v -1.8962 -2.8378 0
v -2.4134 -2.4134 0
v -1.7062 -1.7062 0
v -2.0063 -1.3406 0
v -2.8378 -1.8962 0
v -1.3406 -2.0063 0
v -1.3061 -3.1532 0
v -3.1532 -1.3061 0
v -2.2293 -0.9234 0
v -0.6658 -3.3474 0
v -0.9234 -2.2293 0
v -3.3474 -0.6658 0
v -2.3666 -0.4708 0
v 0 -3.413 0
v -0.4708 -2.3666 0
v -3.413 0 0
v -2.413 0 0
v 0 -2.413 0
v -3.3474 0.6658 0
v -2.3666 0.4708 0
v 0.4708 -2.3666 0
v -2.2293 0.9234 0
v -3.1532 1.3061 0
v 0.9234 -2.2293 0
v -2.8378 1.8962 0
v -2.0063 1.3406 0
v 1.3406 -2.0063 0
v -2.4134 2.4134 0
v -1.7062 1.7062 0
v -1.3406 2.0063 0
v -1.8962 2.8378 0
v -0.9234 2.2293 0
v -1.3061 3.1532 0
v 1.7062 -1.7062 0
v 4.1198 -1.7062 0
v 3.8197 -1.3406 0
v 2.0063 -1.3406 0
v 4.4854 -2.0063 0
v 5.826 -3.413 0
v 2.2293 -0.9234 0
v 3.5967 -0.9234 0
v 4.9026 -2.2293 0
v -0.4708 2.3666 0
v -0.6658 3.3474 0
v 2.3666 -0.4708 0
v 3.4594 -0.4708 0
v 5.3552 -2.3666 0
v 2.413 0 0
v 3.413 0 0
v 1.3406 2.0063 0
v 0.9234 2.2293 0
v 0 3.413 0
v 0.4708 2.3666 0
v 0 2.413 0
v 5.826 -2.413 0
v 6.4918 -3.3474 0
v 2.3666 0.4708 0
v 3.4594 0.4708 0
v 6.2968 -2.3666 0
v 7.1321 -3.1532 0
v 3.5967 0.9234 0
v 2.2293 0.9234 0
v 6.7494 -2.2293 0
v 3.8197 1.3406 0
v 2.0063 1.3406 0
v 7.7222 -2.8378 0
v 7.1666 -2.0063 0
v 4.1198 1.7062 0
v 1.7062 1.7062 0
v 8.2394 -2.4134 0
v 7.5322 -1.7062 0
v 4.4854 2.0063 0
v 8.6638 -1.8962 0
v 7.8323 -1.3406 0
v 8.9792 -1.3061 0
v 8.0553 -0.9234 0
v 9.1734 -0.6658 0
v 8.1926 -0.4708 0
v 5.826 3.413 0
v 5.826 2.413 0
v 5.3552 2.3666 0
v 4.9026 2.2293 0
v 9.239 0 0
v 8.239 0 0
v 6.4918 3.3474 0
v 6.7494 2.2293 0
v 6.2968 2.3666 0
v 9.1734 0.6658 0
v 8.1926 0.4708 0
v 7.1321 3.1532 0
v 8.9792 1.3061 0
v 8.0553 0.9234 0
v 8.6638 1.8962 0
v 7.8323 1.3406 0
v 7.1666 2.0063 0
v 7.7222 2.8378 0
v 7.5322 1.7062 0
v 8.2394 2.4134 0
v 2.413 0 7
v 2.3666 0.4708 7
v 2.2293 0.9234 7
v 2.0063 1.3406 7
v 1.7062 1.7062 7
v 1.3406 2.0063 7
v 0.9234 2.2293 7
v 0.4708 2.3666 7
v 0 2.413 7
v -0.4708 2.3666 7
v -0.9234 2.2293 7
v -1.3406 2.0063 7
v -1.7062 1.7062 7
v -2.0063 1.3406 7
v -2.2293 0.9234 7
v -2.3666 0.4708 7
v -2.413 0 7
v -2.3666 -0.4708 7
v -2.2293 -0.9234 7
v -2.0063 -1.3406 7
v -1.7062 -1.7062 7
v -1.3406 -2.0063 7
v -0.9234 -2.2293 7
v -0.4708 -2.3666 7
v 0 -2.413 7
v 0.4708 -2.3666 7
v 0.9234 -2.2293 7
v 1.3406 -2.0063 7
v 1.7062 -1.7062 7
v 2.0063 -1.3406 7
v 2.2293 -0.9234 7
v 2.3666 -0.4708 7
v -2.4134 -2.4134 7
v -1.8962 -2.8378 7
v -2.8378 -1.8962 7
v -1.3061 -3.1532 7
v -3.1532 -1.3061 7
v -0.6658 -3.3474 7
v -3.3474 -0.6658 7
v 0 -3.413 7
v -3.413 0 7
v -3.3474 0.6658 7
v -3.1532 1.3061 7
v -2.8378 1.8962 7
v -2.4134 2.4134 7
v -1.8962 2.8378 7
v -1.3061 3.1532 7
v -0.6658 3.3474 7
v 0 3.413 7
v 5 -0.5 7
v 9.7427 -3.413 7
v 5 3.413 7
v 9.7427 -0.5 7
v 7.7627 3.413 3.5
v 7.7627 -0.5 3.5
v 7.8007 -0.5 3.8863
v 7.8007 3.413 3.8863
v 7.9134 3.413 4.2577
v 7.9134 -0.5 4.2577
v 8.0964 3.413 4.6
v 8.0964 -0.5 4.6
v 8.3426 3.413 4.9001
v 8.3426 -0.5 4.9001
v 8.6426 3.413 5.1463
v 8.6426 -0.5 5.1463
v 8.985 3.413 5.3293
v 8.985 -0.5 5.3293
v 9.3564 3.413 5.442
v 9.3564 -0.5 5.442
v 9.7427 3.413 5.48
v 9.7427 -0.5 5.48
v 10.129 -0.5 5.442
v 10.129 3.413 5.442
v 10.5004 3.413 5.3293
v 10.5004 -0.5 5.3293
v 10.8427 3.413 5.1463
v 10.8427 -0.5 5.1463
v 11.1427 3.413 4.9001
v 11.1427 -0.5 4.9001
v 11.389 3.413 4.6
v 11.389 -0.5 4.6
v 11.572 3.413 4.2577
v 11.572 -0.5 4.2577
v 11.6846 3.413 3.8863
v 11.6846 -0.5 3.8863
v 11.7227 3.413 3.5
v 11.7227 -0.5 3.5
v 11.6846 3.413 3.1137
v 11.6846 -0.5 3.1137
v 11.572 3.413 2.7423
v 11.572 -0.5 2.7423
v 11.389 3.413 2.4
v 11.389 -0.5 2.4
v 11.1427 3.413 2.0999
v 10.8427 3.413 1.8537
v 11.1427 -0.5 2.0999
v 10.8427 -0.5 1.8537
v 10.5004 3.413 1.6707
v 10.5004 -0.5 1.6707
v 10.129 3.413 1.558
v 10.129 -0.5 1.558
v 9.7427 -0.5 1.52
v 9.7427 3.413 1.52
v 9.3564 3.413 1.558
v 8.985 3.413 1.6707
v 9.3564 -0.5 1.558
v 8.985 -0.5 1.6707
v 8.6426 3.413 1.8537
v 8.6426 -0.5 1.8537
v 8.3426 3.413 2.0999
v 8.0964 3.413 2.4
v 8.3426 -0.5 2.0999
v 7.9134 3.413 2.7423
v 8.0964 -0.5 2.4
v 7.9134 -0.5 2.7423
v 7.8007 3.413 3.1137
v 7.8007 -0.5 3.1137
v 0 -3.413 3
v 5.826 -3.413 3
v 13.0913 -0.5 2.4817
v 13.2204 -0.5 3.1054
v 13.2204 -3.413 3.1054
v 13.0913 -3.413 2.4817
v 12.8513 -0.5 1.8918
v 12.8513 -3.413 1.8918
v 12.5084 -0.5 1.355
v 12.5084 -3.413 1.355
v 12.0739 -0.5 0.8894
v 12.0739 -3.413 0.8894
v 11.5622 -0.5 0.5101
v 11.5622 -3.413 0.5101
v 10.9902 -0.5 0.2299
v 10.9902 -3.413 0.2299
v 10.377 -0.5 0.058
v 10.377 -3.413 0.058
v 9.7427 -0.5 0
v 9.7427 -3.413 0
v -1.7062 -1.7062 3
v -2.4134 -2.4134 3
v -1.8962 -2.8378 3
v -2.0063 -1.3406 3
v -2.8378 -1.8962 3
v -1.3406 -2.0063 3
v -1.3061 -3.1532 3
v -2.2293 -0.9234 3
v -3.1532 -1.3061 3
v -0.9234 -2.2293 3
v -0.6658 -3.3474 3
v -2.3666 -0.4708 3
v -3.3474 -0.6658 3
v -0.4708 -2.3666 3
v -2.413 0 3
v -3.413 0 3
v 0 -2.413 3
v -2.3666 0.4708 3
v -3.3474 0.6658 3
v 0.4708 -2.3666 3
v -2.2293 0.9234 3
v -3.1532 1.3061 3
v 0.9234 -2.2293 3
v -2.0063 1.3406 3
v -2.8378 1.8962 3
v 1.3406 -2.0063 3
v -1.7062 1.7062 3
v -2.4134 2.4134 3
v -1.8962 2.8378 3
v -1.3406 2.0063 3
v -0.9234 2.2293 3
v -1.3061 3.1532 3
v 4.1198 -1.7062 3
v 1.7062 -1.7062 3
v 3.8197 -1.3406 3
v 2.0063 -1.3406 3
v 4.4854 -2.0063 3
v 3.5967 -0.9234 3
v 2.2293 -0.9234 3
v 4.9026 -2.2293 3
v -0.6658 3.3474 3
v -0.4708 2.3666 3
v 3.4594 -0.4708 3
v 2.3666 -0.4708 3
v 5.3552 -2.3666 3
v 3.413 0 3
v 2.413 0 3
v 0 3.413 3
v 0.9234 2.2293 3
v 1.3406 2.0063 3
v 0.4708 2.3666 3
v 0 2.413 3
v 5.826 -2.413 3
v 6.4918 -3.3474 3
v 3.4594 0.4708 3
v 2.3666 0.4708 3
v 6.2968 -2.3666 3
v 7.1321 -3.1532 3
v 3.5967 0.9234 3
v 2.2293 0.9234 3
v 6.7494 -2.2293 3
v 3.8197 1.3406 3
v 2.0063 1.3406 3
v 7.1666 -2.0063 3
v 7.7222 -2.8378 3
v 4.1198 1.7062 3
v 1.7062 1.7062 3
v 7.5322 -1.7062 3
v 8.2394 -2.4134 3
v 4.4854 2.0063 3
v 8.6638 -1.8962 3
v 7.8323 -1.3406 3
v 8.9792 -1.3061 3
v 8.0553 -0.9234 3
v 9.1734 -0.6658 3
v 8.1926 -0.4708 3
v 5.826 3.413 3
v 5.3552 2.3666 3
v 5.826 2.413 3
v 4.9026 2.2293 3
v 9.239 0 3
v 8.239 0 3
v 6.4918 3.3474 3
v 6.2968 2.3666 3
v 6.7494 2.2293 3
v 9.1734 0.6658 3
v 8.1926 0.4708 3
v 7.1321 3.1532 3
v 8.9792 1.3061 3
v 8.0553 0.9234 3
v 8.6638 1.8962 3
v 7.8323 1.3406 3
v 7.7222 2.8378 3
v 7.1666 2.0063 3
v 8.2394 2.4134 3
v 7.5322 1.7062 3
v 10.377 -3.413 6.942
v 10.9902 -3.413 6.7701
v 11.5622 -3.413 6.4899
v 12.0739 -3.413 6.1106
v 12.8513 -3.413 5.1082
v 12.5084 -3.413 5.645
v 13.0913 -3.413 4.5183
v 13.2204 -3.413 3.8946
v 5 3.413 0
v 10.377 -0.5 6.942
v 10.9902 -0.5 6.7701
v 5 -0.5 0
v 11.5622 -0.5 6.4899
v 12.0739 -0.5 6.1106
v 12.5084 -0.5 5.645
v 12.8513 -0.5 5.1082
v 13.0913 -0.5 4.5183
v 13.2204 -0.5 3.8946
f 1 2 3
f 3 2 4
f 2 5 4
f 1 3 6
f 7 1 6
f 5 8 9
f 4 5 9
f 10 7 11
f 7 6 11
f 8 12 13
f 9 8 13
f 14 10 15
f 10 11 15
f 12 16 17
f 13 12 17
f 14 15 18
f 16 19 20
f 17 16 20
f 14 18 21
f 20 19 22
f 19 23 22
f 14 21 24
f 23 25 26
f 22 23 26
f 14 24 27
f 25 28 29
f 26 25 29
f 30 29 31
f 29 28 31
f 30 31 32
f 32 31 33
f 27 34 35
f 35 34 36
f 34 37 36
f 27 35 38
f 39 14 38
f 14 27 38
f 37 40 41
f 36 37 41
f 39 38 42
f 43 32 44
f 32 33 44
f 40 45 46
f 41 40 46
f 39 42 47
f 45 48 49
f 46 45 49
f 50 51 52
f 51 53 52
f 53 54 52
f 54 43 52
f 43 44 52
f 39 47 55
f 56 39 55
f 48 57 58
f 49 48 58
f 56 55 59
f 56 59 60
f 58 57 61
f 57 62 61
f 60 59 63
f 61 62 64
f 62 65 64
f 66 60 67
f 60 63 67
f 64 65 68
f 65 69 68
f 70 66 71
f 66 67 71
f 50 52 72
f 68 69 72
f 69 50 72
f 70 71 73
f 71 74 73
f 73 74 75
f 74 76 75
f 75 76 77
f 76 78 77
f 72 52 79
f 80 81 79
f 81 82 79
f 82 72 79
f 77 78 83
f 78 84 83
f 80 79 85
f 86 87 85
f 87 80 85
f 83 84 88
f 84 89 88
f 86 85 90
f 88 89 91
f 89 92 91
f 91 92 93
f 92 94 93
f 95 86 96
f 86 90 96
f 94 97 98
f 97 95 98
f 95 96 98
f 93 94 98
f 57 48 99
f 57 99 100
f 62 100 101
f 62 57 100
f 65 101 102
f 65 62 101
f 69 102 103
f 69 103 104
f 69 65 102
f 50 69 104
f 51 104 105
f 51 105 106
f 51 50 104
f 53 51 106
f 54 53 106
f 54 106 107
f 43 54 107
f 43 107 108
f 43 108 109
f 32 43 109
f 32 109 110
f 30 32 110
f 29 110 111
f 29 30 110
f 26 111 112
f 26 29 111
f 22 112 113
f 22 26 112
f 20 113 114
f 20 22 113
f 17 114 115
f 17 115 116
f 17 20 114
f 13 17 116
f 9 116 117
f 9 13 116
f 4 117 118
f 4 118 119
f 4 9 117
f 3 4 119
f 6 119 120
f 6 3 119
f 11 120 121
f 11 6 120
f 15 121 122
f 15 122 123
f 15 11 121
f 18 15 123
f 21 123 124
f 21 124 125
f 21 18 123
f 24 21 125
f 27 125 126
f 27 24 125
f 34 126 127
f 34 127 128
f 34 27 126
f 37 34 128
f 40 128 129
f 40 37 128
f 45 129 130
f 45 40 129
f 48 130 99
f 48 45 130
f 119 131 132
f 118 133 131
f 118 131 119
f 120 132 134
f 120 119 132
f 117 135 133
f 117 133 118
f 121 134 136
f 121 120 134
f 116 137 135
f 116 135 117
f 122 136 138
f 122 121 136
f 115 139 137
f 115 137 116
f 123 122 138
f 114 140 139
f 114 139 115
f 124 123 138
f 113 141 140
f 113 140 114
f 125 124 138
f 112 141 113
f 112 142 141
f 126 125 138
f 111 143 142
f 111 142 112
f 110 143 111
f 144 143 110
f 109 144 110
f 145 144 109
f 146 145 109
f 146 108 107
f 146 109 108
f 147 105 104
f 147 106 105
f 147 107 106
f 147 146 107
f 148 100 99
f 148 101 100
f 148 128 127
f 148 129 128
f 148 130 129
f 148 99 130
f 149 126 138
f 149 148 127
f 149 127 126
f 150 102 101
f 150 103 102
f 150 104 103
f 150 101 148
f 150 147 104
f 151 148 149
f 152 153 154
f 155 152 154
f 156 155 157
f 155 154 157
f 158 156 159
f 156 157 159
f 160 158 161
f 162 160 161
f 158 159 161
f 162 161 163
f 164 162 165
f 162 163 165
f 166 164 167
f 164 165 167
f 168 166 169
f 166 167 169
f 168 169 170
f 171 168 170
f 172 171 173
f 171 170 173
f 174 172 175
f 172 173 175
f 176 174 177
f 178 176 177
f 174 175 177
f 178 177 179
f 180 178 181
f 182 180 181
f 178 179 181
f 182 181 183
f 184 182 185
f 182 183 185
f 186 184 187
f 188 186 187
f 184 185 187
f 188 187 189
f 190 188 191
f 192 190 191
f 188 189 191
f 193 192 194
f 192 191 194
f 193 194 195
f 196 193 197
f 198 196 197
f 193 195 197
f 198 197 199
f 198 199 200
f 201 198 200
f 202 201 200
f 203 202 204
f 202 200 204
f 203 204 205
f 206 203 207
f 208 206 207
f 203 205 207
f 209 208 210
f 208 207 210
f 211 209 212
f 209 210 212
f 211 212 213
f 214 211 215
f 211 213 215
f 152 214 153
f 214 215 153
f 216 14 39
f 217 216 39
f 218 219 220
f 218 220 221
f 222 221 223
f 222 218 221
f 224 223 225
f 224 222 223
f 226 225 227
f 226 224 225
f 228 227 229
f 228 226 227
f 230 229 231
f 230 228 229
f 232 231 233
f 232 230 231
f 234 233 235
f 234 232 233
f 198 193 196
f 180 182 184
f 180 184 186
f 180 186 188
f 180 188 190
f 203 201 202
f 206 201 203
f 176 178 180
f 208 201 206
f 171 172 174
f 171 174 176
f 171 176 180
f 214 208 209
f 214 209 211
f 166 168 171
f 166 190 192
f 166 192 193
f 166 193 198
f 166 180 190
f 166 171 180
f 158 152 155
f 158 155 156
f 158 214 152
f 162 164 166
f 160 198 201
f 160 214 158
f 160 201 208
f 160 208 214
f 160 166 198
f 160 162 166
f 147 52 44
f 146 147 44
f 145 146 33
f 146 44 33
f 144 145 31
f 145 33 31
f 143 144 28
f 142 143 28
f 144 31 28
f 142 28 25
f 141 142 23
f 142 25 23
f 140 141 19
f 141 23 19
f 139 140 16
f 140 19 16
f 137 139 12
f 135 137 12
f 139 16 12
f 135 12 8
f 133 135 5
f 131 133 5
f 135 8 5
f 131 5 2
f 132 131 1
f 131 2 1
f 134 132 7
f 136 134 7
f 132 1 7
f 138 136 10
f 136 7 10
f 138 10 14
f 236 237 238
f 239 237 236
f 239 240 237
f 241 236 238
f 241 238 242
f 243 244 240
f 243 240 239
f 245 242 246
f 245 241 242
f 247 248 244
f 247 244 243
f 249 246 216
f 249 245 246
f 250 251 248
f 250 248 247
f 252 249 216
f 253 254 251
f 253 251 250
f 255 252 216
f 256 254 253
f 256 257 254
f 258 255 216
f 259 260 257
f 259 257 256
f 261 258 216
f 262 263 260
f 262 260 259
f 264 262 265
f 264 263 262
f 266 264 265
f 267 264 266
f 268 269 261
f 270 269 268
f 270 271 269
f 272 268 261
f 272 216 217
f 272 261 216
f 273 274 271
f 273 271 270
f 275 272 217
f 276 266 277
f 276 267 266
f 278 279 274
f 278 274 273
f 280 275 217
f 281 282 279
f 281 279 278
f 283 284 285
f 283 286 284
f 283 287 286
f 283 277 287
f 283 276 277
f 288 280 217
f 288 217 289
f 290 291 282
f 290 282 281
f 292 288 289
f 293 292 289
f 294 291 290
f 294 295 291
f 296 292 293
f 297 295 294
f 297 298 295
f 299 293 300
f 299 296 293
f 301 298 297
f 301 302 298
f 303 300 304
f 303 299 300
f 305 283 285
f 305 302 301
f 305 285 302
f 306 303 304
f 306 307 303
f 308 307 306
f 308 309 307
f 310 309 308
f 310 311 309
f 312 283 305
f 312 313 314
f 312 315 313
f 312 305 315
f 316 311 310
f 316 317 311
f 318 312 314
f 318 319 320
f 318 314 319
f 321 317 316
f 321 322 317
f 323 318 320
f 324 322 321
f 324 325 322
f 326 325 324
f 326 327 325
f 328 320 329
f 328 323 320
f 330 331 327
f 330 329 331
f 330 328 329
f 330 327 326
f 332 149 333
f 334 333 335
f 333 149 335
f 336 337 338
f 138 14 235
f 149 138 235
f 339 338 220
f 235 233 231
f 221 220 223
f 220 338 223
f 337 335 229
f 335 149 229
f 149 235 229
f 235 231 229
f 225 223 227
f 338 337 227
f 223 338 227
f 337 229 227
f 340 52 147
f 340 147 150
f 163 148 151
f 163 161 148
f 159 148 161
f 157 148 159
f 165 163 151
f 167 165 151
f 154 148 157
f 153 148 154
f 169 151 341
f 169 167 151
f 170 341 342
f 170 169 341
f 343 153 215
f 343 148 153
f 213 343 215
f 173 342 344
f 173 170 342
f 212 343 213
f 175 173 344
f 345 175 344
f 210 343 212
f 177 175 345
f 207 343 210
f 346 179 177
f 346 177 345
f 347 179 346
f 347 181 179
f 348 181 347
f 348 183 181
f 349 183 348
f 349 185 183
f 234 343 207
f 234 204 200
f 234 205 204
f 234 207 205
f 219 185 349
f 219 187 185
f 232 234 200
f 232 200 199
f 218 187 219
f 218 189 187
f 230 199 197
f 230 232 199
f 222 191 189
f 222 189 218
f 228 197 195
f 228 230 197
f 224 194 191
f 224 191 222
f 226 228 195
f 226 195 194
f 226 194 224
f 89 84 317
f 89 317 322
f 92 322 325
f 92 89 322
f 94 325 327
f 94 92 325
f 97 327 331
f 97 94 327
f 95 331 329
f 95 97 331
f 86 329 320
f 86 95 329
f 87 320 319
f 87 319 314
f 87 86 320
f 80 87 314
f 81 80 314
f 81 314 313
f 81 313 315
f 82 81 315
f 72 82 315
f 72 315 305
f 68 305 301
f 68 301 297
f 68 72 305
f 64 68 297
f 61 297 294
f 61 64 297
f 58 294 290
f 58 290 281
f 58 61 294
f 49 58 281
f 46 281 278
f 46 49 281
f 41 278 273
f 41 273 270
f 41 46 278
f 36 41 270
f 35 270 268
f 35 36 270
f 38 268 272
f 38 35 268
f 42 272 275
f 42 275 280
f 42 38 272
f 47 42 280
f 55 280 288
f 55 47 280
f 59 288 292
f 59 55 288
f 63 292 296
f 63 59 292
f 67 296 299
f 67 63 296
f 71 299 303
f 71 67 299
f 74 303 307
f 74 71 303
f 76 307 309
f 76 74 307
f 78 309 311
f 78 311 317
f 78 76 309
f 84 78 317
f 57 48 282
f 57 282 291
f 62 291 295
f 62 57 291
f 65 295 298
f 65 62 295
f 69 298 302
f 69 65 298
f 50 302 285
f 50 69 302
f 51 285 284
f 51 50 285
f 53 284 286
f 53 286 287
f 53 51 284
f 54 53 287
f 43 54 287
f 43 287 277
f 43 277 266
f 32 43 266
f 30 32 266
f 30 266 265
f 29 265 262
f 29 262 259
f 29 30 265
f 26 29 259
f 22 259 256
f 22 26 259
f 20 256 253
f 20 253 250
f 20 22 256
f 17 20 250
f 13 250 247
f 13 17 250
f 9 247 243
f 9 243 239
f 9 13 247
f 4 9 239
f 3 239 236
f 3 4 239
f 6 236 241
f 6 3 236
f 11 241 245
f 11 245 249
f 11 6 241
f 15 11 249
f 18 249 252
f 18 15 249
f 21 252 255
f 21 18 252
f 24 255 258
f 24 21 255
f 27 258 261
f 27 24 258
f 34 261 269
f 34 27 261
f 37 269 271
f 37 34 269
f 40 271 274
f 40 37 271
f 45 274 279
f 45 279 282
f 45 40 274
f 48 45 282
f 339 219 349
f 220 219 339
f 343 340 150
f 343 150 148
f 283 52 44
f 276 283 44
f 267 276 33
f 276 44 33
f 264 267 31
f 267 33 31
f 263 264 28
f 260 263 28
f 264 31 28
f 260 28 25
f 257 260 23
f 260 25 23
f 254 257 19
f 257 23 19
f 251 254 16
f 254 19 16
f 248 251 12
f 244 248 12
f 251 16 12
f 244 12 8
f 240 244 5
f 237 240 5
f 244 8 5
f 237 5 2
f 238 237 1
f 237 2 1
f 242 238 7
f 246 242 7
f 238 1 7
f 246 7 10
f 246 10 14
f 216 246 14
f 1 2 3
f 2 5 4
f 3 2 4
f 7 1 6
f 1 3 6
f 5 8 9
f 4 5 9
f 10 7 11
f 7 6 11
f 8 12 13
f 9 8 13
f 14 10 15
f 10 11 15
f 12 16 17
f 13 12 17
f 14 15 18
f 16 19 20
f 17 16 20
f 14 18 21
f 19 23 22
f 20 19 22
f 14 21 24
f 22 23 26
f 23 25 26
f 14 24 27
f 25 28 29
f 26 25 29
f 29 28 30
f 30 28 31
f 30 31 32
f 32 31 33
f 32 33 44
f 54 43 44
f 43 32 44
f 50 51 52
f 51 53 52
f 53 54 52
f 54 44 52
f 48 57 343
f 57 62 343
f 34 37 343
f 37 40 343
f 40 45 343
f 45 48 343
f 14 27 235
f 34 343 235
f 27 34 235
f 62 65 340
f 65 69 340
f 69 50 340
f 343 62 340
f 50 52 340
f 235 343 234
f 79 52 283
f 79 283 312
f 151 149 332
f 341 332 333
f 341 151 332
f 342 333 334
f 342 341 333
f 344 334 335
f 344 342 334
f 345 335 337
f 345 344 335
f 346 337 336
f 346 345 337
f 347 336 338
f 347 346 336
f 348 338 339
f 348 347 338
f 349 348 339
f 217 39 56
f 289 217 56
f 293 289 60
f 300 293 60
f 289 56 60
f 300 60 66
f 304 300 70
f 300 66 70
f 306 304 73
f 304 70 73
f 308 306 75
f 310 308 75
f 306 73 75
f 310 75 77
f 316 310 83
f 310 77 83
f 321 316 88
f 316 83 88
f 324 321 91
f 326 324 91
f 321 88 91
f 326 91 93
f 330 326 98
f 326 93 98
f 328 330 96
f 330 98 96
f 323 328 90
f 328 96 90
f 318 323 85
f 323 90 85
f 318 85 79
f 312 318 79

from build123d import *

# Parameters (mm, degrees)
SKETCH_R     = 2.413
PAD_DEPTH    = 3
SKETCH001_R  = 2.413
PAD001_DEPTH = 7
POCKET_DEPTH = 5
SKETCH003_R  = 1.98
PAD002_DEPTH = 3.913


with BuildPart() as old_bushing:
    # Sketch → Pad (new body)
    with BuildSketch(Plane.XY):
        with BuildLine():
            ThreePointArc((0, 3.413), (-3.413, 0), (0, -3.413))
            Line((0, -3.413), (5.826, -3.413))
            ThreePointArc((5.826, -3.413), (9.239, 0), (5.826, 3.413))
            Line((0, 3.413), (5.826, 3.413))
        make_face()
        Circle(SKETCH_R, mode=Mode.SUBTRACT)
        with Locations((5.826, 0)):
            Circle(SKETCH_R, mode=Mode.SUBTRACT)
    extrude(amount=PAD_DEPTH)


with BuildPart() as body001:
    # Sketch001 → Pad001 (new body)
    with BuildSketch(Plane.XY):
        with BuildLine():
            ThreePointArc((0, 3.413), (-3.413, 0), (0, -3.413))
            Line((0, -3.413), (13.220365, -3.413))
            Line((13.220365, -0.5), (13.220365, -3.413))
            Line((5, -0.5), (13.220365, -0.5))
            Line((5, 3.413), (5, -0.5))
            Line((0, 3.413), (5, 3.413))
        make_face()
        Circle(SKETCH001_R, mode=Mode.SUBTRACT)
    extrude(amount=PAD001_DEPTH)

    # Sketch002 (on Face5 of Pad001) → Pocket (cut)
    with BuildSketch(Plane(origin=(0, -0.5, 0), x_dir=(-1, 0, 0), z_dir=(0, 1, 0))):
        with BuildLine():
            ThreePointArc((-9.742675, 7), (-13.242675, 3.5), (-9.742675, 0))
            Line((-14.166568, 0), (-9.742675, 0))
            Line((-14.166568, 7), (-14.166568, 0))
            Line((-9.742675, 7), (-14.166568, 7))
        make_face()
    extrude(amount=-POCKET_DEPTH, mode=Mode.SUBTRACT)

    # Sketch003 (on Face5 of Pad001) → Pad002 (join)
    with BuildSketch(Plane(origin=(0, -0.5, 0), x_dir=(-1, 0, 0), z_dir=(0, 1, 0))):
        with Locations((-9.742675, 3.5)):
            Circle(SKETCH003_R)
    extrude(amount=PAD002_DEPTH)


solid = Compound([old_bushing.part, body001.part])
